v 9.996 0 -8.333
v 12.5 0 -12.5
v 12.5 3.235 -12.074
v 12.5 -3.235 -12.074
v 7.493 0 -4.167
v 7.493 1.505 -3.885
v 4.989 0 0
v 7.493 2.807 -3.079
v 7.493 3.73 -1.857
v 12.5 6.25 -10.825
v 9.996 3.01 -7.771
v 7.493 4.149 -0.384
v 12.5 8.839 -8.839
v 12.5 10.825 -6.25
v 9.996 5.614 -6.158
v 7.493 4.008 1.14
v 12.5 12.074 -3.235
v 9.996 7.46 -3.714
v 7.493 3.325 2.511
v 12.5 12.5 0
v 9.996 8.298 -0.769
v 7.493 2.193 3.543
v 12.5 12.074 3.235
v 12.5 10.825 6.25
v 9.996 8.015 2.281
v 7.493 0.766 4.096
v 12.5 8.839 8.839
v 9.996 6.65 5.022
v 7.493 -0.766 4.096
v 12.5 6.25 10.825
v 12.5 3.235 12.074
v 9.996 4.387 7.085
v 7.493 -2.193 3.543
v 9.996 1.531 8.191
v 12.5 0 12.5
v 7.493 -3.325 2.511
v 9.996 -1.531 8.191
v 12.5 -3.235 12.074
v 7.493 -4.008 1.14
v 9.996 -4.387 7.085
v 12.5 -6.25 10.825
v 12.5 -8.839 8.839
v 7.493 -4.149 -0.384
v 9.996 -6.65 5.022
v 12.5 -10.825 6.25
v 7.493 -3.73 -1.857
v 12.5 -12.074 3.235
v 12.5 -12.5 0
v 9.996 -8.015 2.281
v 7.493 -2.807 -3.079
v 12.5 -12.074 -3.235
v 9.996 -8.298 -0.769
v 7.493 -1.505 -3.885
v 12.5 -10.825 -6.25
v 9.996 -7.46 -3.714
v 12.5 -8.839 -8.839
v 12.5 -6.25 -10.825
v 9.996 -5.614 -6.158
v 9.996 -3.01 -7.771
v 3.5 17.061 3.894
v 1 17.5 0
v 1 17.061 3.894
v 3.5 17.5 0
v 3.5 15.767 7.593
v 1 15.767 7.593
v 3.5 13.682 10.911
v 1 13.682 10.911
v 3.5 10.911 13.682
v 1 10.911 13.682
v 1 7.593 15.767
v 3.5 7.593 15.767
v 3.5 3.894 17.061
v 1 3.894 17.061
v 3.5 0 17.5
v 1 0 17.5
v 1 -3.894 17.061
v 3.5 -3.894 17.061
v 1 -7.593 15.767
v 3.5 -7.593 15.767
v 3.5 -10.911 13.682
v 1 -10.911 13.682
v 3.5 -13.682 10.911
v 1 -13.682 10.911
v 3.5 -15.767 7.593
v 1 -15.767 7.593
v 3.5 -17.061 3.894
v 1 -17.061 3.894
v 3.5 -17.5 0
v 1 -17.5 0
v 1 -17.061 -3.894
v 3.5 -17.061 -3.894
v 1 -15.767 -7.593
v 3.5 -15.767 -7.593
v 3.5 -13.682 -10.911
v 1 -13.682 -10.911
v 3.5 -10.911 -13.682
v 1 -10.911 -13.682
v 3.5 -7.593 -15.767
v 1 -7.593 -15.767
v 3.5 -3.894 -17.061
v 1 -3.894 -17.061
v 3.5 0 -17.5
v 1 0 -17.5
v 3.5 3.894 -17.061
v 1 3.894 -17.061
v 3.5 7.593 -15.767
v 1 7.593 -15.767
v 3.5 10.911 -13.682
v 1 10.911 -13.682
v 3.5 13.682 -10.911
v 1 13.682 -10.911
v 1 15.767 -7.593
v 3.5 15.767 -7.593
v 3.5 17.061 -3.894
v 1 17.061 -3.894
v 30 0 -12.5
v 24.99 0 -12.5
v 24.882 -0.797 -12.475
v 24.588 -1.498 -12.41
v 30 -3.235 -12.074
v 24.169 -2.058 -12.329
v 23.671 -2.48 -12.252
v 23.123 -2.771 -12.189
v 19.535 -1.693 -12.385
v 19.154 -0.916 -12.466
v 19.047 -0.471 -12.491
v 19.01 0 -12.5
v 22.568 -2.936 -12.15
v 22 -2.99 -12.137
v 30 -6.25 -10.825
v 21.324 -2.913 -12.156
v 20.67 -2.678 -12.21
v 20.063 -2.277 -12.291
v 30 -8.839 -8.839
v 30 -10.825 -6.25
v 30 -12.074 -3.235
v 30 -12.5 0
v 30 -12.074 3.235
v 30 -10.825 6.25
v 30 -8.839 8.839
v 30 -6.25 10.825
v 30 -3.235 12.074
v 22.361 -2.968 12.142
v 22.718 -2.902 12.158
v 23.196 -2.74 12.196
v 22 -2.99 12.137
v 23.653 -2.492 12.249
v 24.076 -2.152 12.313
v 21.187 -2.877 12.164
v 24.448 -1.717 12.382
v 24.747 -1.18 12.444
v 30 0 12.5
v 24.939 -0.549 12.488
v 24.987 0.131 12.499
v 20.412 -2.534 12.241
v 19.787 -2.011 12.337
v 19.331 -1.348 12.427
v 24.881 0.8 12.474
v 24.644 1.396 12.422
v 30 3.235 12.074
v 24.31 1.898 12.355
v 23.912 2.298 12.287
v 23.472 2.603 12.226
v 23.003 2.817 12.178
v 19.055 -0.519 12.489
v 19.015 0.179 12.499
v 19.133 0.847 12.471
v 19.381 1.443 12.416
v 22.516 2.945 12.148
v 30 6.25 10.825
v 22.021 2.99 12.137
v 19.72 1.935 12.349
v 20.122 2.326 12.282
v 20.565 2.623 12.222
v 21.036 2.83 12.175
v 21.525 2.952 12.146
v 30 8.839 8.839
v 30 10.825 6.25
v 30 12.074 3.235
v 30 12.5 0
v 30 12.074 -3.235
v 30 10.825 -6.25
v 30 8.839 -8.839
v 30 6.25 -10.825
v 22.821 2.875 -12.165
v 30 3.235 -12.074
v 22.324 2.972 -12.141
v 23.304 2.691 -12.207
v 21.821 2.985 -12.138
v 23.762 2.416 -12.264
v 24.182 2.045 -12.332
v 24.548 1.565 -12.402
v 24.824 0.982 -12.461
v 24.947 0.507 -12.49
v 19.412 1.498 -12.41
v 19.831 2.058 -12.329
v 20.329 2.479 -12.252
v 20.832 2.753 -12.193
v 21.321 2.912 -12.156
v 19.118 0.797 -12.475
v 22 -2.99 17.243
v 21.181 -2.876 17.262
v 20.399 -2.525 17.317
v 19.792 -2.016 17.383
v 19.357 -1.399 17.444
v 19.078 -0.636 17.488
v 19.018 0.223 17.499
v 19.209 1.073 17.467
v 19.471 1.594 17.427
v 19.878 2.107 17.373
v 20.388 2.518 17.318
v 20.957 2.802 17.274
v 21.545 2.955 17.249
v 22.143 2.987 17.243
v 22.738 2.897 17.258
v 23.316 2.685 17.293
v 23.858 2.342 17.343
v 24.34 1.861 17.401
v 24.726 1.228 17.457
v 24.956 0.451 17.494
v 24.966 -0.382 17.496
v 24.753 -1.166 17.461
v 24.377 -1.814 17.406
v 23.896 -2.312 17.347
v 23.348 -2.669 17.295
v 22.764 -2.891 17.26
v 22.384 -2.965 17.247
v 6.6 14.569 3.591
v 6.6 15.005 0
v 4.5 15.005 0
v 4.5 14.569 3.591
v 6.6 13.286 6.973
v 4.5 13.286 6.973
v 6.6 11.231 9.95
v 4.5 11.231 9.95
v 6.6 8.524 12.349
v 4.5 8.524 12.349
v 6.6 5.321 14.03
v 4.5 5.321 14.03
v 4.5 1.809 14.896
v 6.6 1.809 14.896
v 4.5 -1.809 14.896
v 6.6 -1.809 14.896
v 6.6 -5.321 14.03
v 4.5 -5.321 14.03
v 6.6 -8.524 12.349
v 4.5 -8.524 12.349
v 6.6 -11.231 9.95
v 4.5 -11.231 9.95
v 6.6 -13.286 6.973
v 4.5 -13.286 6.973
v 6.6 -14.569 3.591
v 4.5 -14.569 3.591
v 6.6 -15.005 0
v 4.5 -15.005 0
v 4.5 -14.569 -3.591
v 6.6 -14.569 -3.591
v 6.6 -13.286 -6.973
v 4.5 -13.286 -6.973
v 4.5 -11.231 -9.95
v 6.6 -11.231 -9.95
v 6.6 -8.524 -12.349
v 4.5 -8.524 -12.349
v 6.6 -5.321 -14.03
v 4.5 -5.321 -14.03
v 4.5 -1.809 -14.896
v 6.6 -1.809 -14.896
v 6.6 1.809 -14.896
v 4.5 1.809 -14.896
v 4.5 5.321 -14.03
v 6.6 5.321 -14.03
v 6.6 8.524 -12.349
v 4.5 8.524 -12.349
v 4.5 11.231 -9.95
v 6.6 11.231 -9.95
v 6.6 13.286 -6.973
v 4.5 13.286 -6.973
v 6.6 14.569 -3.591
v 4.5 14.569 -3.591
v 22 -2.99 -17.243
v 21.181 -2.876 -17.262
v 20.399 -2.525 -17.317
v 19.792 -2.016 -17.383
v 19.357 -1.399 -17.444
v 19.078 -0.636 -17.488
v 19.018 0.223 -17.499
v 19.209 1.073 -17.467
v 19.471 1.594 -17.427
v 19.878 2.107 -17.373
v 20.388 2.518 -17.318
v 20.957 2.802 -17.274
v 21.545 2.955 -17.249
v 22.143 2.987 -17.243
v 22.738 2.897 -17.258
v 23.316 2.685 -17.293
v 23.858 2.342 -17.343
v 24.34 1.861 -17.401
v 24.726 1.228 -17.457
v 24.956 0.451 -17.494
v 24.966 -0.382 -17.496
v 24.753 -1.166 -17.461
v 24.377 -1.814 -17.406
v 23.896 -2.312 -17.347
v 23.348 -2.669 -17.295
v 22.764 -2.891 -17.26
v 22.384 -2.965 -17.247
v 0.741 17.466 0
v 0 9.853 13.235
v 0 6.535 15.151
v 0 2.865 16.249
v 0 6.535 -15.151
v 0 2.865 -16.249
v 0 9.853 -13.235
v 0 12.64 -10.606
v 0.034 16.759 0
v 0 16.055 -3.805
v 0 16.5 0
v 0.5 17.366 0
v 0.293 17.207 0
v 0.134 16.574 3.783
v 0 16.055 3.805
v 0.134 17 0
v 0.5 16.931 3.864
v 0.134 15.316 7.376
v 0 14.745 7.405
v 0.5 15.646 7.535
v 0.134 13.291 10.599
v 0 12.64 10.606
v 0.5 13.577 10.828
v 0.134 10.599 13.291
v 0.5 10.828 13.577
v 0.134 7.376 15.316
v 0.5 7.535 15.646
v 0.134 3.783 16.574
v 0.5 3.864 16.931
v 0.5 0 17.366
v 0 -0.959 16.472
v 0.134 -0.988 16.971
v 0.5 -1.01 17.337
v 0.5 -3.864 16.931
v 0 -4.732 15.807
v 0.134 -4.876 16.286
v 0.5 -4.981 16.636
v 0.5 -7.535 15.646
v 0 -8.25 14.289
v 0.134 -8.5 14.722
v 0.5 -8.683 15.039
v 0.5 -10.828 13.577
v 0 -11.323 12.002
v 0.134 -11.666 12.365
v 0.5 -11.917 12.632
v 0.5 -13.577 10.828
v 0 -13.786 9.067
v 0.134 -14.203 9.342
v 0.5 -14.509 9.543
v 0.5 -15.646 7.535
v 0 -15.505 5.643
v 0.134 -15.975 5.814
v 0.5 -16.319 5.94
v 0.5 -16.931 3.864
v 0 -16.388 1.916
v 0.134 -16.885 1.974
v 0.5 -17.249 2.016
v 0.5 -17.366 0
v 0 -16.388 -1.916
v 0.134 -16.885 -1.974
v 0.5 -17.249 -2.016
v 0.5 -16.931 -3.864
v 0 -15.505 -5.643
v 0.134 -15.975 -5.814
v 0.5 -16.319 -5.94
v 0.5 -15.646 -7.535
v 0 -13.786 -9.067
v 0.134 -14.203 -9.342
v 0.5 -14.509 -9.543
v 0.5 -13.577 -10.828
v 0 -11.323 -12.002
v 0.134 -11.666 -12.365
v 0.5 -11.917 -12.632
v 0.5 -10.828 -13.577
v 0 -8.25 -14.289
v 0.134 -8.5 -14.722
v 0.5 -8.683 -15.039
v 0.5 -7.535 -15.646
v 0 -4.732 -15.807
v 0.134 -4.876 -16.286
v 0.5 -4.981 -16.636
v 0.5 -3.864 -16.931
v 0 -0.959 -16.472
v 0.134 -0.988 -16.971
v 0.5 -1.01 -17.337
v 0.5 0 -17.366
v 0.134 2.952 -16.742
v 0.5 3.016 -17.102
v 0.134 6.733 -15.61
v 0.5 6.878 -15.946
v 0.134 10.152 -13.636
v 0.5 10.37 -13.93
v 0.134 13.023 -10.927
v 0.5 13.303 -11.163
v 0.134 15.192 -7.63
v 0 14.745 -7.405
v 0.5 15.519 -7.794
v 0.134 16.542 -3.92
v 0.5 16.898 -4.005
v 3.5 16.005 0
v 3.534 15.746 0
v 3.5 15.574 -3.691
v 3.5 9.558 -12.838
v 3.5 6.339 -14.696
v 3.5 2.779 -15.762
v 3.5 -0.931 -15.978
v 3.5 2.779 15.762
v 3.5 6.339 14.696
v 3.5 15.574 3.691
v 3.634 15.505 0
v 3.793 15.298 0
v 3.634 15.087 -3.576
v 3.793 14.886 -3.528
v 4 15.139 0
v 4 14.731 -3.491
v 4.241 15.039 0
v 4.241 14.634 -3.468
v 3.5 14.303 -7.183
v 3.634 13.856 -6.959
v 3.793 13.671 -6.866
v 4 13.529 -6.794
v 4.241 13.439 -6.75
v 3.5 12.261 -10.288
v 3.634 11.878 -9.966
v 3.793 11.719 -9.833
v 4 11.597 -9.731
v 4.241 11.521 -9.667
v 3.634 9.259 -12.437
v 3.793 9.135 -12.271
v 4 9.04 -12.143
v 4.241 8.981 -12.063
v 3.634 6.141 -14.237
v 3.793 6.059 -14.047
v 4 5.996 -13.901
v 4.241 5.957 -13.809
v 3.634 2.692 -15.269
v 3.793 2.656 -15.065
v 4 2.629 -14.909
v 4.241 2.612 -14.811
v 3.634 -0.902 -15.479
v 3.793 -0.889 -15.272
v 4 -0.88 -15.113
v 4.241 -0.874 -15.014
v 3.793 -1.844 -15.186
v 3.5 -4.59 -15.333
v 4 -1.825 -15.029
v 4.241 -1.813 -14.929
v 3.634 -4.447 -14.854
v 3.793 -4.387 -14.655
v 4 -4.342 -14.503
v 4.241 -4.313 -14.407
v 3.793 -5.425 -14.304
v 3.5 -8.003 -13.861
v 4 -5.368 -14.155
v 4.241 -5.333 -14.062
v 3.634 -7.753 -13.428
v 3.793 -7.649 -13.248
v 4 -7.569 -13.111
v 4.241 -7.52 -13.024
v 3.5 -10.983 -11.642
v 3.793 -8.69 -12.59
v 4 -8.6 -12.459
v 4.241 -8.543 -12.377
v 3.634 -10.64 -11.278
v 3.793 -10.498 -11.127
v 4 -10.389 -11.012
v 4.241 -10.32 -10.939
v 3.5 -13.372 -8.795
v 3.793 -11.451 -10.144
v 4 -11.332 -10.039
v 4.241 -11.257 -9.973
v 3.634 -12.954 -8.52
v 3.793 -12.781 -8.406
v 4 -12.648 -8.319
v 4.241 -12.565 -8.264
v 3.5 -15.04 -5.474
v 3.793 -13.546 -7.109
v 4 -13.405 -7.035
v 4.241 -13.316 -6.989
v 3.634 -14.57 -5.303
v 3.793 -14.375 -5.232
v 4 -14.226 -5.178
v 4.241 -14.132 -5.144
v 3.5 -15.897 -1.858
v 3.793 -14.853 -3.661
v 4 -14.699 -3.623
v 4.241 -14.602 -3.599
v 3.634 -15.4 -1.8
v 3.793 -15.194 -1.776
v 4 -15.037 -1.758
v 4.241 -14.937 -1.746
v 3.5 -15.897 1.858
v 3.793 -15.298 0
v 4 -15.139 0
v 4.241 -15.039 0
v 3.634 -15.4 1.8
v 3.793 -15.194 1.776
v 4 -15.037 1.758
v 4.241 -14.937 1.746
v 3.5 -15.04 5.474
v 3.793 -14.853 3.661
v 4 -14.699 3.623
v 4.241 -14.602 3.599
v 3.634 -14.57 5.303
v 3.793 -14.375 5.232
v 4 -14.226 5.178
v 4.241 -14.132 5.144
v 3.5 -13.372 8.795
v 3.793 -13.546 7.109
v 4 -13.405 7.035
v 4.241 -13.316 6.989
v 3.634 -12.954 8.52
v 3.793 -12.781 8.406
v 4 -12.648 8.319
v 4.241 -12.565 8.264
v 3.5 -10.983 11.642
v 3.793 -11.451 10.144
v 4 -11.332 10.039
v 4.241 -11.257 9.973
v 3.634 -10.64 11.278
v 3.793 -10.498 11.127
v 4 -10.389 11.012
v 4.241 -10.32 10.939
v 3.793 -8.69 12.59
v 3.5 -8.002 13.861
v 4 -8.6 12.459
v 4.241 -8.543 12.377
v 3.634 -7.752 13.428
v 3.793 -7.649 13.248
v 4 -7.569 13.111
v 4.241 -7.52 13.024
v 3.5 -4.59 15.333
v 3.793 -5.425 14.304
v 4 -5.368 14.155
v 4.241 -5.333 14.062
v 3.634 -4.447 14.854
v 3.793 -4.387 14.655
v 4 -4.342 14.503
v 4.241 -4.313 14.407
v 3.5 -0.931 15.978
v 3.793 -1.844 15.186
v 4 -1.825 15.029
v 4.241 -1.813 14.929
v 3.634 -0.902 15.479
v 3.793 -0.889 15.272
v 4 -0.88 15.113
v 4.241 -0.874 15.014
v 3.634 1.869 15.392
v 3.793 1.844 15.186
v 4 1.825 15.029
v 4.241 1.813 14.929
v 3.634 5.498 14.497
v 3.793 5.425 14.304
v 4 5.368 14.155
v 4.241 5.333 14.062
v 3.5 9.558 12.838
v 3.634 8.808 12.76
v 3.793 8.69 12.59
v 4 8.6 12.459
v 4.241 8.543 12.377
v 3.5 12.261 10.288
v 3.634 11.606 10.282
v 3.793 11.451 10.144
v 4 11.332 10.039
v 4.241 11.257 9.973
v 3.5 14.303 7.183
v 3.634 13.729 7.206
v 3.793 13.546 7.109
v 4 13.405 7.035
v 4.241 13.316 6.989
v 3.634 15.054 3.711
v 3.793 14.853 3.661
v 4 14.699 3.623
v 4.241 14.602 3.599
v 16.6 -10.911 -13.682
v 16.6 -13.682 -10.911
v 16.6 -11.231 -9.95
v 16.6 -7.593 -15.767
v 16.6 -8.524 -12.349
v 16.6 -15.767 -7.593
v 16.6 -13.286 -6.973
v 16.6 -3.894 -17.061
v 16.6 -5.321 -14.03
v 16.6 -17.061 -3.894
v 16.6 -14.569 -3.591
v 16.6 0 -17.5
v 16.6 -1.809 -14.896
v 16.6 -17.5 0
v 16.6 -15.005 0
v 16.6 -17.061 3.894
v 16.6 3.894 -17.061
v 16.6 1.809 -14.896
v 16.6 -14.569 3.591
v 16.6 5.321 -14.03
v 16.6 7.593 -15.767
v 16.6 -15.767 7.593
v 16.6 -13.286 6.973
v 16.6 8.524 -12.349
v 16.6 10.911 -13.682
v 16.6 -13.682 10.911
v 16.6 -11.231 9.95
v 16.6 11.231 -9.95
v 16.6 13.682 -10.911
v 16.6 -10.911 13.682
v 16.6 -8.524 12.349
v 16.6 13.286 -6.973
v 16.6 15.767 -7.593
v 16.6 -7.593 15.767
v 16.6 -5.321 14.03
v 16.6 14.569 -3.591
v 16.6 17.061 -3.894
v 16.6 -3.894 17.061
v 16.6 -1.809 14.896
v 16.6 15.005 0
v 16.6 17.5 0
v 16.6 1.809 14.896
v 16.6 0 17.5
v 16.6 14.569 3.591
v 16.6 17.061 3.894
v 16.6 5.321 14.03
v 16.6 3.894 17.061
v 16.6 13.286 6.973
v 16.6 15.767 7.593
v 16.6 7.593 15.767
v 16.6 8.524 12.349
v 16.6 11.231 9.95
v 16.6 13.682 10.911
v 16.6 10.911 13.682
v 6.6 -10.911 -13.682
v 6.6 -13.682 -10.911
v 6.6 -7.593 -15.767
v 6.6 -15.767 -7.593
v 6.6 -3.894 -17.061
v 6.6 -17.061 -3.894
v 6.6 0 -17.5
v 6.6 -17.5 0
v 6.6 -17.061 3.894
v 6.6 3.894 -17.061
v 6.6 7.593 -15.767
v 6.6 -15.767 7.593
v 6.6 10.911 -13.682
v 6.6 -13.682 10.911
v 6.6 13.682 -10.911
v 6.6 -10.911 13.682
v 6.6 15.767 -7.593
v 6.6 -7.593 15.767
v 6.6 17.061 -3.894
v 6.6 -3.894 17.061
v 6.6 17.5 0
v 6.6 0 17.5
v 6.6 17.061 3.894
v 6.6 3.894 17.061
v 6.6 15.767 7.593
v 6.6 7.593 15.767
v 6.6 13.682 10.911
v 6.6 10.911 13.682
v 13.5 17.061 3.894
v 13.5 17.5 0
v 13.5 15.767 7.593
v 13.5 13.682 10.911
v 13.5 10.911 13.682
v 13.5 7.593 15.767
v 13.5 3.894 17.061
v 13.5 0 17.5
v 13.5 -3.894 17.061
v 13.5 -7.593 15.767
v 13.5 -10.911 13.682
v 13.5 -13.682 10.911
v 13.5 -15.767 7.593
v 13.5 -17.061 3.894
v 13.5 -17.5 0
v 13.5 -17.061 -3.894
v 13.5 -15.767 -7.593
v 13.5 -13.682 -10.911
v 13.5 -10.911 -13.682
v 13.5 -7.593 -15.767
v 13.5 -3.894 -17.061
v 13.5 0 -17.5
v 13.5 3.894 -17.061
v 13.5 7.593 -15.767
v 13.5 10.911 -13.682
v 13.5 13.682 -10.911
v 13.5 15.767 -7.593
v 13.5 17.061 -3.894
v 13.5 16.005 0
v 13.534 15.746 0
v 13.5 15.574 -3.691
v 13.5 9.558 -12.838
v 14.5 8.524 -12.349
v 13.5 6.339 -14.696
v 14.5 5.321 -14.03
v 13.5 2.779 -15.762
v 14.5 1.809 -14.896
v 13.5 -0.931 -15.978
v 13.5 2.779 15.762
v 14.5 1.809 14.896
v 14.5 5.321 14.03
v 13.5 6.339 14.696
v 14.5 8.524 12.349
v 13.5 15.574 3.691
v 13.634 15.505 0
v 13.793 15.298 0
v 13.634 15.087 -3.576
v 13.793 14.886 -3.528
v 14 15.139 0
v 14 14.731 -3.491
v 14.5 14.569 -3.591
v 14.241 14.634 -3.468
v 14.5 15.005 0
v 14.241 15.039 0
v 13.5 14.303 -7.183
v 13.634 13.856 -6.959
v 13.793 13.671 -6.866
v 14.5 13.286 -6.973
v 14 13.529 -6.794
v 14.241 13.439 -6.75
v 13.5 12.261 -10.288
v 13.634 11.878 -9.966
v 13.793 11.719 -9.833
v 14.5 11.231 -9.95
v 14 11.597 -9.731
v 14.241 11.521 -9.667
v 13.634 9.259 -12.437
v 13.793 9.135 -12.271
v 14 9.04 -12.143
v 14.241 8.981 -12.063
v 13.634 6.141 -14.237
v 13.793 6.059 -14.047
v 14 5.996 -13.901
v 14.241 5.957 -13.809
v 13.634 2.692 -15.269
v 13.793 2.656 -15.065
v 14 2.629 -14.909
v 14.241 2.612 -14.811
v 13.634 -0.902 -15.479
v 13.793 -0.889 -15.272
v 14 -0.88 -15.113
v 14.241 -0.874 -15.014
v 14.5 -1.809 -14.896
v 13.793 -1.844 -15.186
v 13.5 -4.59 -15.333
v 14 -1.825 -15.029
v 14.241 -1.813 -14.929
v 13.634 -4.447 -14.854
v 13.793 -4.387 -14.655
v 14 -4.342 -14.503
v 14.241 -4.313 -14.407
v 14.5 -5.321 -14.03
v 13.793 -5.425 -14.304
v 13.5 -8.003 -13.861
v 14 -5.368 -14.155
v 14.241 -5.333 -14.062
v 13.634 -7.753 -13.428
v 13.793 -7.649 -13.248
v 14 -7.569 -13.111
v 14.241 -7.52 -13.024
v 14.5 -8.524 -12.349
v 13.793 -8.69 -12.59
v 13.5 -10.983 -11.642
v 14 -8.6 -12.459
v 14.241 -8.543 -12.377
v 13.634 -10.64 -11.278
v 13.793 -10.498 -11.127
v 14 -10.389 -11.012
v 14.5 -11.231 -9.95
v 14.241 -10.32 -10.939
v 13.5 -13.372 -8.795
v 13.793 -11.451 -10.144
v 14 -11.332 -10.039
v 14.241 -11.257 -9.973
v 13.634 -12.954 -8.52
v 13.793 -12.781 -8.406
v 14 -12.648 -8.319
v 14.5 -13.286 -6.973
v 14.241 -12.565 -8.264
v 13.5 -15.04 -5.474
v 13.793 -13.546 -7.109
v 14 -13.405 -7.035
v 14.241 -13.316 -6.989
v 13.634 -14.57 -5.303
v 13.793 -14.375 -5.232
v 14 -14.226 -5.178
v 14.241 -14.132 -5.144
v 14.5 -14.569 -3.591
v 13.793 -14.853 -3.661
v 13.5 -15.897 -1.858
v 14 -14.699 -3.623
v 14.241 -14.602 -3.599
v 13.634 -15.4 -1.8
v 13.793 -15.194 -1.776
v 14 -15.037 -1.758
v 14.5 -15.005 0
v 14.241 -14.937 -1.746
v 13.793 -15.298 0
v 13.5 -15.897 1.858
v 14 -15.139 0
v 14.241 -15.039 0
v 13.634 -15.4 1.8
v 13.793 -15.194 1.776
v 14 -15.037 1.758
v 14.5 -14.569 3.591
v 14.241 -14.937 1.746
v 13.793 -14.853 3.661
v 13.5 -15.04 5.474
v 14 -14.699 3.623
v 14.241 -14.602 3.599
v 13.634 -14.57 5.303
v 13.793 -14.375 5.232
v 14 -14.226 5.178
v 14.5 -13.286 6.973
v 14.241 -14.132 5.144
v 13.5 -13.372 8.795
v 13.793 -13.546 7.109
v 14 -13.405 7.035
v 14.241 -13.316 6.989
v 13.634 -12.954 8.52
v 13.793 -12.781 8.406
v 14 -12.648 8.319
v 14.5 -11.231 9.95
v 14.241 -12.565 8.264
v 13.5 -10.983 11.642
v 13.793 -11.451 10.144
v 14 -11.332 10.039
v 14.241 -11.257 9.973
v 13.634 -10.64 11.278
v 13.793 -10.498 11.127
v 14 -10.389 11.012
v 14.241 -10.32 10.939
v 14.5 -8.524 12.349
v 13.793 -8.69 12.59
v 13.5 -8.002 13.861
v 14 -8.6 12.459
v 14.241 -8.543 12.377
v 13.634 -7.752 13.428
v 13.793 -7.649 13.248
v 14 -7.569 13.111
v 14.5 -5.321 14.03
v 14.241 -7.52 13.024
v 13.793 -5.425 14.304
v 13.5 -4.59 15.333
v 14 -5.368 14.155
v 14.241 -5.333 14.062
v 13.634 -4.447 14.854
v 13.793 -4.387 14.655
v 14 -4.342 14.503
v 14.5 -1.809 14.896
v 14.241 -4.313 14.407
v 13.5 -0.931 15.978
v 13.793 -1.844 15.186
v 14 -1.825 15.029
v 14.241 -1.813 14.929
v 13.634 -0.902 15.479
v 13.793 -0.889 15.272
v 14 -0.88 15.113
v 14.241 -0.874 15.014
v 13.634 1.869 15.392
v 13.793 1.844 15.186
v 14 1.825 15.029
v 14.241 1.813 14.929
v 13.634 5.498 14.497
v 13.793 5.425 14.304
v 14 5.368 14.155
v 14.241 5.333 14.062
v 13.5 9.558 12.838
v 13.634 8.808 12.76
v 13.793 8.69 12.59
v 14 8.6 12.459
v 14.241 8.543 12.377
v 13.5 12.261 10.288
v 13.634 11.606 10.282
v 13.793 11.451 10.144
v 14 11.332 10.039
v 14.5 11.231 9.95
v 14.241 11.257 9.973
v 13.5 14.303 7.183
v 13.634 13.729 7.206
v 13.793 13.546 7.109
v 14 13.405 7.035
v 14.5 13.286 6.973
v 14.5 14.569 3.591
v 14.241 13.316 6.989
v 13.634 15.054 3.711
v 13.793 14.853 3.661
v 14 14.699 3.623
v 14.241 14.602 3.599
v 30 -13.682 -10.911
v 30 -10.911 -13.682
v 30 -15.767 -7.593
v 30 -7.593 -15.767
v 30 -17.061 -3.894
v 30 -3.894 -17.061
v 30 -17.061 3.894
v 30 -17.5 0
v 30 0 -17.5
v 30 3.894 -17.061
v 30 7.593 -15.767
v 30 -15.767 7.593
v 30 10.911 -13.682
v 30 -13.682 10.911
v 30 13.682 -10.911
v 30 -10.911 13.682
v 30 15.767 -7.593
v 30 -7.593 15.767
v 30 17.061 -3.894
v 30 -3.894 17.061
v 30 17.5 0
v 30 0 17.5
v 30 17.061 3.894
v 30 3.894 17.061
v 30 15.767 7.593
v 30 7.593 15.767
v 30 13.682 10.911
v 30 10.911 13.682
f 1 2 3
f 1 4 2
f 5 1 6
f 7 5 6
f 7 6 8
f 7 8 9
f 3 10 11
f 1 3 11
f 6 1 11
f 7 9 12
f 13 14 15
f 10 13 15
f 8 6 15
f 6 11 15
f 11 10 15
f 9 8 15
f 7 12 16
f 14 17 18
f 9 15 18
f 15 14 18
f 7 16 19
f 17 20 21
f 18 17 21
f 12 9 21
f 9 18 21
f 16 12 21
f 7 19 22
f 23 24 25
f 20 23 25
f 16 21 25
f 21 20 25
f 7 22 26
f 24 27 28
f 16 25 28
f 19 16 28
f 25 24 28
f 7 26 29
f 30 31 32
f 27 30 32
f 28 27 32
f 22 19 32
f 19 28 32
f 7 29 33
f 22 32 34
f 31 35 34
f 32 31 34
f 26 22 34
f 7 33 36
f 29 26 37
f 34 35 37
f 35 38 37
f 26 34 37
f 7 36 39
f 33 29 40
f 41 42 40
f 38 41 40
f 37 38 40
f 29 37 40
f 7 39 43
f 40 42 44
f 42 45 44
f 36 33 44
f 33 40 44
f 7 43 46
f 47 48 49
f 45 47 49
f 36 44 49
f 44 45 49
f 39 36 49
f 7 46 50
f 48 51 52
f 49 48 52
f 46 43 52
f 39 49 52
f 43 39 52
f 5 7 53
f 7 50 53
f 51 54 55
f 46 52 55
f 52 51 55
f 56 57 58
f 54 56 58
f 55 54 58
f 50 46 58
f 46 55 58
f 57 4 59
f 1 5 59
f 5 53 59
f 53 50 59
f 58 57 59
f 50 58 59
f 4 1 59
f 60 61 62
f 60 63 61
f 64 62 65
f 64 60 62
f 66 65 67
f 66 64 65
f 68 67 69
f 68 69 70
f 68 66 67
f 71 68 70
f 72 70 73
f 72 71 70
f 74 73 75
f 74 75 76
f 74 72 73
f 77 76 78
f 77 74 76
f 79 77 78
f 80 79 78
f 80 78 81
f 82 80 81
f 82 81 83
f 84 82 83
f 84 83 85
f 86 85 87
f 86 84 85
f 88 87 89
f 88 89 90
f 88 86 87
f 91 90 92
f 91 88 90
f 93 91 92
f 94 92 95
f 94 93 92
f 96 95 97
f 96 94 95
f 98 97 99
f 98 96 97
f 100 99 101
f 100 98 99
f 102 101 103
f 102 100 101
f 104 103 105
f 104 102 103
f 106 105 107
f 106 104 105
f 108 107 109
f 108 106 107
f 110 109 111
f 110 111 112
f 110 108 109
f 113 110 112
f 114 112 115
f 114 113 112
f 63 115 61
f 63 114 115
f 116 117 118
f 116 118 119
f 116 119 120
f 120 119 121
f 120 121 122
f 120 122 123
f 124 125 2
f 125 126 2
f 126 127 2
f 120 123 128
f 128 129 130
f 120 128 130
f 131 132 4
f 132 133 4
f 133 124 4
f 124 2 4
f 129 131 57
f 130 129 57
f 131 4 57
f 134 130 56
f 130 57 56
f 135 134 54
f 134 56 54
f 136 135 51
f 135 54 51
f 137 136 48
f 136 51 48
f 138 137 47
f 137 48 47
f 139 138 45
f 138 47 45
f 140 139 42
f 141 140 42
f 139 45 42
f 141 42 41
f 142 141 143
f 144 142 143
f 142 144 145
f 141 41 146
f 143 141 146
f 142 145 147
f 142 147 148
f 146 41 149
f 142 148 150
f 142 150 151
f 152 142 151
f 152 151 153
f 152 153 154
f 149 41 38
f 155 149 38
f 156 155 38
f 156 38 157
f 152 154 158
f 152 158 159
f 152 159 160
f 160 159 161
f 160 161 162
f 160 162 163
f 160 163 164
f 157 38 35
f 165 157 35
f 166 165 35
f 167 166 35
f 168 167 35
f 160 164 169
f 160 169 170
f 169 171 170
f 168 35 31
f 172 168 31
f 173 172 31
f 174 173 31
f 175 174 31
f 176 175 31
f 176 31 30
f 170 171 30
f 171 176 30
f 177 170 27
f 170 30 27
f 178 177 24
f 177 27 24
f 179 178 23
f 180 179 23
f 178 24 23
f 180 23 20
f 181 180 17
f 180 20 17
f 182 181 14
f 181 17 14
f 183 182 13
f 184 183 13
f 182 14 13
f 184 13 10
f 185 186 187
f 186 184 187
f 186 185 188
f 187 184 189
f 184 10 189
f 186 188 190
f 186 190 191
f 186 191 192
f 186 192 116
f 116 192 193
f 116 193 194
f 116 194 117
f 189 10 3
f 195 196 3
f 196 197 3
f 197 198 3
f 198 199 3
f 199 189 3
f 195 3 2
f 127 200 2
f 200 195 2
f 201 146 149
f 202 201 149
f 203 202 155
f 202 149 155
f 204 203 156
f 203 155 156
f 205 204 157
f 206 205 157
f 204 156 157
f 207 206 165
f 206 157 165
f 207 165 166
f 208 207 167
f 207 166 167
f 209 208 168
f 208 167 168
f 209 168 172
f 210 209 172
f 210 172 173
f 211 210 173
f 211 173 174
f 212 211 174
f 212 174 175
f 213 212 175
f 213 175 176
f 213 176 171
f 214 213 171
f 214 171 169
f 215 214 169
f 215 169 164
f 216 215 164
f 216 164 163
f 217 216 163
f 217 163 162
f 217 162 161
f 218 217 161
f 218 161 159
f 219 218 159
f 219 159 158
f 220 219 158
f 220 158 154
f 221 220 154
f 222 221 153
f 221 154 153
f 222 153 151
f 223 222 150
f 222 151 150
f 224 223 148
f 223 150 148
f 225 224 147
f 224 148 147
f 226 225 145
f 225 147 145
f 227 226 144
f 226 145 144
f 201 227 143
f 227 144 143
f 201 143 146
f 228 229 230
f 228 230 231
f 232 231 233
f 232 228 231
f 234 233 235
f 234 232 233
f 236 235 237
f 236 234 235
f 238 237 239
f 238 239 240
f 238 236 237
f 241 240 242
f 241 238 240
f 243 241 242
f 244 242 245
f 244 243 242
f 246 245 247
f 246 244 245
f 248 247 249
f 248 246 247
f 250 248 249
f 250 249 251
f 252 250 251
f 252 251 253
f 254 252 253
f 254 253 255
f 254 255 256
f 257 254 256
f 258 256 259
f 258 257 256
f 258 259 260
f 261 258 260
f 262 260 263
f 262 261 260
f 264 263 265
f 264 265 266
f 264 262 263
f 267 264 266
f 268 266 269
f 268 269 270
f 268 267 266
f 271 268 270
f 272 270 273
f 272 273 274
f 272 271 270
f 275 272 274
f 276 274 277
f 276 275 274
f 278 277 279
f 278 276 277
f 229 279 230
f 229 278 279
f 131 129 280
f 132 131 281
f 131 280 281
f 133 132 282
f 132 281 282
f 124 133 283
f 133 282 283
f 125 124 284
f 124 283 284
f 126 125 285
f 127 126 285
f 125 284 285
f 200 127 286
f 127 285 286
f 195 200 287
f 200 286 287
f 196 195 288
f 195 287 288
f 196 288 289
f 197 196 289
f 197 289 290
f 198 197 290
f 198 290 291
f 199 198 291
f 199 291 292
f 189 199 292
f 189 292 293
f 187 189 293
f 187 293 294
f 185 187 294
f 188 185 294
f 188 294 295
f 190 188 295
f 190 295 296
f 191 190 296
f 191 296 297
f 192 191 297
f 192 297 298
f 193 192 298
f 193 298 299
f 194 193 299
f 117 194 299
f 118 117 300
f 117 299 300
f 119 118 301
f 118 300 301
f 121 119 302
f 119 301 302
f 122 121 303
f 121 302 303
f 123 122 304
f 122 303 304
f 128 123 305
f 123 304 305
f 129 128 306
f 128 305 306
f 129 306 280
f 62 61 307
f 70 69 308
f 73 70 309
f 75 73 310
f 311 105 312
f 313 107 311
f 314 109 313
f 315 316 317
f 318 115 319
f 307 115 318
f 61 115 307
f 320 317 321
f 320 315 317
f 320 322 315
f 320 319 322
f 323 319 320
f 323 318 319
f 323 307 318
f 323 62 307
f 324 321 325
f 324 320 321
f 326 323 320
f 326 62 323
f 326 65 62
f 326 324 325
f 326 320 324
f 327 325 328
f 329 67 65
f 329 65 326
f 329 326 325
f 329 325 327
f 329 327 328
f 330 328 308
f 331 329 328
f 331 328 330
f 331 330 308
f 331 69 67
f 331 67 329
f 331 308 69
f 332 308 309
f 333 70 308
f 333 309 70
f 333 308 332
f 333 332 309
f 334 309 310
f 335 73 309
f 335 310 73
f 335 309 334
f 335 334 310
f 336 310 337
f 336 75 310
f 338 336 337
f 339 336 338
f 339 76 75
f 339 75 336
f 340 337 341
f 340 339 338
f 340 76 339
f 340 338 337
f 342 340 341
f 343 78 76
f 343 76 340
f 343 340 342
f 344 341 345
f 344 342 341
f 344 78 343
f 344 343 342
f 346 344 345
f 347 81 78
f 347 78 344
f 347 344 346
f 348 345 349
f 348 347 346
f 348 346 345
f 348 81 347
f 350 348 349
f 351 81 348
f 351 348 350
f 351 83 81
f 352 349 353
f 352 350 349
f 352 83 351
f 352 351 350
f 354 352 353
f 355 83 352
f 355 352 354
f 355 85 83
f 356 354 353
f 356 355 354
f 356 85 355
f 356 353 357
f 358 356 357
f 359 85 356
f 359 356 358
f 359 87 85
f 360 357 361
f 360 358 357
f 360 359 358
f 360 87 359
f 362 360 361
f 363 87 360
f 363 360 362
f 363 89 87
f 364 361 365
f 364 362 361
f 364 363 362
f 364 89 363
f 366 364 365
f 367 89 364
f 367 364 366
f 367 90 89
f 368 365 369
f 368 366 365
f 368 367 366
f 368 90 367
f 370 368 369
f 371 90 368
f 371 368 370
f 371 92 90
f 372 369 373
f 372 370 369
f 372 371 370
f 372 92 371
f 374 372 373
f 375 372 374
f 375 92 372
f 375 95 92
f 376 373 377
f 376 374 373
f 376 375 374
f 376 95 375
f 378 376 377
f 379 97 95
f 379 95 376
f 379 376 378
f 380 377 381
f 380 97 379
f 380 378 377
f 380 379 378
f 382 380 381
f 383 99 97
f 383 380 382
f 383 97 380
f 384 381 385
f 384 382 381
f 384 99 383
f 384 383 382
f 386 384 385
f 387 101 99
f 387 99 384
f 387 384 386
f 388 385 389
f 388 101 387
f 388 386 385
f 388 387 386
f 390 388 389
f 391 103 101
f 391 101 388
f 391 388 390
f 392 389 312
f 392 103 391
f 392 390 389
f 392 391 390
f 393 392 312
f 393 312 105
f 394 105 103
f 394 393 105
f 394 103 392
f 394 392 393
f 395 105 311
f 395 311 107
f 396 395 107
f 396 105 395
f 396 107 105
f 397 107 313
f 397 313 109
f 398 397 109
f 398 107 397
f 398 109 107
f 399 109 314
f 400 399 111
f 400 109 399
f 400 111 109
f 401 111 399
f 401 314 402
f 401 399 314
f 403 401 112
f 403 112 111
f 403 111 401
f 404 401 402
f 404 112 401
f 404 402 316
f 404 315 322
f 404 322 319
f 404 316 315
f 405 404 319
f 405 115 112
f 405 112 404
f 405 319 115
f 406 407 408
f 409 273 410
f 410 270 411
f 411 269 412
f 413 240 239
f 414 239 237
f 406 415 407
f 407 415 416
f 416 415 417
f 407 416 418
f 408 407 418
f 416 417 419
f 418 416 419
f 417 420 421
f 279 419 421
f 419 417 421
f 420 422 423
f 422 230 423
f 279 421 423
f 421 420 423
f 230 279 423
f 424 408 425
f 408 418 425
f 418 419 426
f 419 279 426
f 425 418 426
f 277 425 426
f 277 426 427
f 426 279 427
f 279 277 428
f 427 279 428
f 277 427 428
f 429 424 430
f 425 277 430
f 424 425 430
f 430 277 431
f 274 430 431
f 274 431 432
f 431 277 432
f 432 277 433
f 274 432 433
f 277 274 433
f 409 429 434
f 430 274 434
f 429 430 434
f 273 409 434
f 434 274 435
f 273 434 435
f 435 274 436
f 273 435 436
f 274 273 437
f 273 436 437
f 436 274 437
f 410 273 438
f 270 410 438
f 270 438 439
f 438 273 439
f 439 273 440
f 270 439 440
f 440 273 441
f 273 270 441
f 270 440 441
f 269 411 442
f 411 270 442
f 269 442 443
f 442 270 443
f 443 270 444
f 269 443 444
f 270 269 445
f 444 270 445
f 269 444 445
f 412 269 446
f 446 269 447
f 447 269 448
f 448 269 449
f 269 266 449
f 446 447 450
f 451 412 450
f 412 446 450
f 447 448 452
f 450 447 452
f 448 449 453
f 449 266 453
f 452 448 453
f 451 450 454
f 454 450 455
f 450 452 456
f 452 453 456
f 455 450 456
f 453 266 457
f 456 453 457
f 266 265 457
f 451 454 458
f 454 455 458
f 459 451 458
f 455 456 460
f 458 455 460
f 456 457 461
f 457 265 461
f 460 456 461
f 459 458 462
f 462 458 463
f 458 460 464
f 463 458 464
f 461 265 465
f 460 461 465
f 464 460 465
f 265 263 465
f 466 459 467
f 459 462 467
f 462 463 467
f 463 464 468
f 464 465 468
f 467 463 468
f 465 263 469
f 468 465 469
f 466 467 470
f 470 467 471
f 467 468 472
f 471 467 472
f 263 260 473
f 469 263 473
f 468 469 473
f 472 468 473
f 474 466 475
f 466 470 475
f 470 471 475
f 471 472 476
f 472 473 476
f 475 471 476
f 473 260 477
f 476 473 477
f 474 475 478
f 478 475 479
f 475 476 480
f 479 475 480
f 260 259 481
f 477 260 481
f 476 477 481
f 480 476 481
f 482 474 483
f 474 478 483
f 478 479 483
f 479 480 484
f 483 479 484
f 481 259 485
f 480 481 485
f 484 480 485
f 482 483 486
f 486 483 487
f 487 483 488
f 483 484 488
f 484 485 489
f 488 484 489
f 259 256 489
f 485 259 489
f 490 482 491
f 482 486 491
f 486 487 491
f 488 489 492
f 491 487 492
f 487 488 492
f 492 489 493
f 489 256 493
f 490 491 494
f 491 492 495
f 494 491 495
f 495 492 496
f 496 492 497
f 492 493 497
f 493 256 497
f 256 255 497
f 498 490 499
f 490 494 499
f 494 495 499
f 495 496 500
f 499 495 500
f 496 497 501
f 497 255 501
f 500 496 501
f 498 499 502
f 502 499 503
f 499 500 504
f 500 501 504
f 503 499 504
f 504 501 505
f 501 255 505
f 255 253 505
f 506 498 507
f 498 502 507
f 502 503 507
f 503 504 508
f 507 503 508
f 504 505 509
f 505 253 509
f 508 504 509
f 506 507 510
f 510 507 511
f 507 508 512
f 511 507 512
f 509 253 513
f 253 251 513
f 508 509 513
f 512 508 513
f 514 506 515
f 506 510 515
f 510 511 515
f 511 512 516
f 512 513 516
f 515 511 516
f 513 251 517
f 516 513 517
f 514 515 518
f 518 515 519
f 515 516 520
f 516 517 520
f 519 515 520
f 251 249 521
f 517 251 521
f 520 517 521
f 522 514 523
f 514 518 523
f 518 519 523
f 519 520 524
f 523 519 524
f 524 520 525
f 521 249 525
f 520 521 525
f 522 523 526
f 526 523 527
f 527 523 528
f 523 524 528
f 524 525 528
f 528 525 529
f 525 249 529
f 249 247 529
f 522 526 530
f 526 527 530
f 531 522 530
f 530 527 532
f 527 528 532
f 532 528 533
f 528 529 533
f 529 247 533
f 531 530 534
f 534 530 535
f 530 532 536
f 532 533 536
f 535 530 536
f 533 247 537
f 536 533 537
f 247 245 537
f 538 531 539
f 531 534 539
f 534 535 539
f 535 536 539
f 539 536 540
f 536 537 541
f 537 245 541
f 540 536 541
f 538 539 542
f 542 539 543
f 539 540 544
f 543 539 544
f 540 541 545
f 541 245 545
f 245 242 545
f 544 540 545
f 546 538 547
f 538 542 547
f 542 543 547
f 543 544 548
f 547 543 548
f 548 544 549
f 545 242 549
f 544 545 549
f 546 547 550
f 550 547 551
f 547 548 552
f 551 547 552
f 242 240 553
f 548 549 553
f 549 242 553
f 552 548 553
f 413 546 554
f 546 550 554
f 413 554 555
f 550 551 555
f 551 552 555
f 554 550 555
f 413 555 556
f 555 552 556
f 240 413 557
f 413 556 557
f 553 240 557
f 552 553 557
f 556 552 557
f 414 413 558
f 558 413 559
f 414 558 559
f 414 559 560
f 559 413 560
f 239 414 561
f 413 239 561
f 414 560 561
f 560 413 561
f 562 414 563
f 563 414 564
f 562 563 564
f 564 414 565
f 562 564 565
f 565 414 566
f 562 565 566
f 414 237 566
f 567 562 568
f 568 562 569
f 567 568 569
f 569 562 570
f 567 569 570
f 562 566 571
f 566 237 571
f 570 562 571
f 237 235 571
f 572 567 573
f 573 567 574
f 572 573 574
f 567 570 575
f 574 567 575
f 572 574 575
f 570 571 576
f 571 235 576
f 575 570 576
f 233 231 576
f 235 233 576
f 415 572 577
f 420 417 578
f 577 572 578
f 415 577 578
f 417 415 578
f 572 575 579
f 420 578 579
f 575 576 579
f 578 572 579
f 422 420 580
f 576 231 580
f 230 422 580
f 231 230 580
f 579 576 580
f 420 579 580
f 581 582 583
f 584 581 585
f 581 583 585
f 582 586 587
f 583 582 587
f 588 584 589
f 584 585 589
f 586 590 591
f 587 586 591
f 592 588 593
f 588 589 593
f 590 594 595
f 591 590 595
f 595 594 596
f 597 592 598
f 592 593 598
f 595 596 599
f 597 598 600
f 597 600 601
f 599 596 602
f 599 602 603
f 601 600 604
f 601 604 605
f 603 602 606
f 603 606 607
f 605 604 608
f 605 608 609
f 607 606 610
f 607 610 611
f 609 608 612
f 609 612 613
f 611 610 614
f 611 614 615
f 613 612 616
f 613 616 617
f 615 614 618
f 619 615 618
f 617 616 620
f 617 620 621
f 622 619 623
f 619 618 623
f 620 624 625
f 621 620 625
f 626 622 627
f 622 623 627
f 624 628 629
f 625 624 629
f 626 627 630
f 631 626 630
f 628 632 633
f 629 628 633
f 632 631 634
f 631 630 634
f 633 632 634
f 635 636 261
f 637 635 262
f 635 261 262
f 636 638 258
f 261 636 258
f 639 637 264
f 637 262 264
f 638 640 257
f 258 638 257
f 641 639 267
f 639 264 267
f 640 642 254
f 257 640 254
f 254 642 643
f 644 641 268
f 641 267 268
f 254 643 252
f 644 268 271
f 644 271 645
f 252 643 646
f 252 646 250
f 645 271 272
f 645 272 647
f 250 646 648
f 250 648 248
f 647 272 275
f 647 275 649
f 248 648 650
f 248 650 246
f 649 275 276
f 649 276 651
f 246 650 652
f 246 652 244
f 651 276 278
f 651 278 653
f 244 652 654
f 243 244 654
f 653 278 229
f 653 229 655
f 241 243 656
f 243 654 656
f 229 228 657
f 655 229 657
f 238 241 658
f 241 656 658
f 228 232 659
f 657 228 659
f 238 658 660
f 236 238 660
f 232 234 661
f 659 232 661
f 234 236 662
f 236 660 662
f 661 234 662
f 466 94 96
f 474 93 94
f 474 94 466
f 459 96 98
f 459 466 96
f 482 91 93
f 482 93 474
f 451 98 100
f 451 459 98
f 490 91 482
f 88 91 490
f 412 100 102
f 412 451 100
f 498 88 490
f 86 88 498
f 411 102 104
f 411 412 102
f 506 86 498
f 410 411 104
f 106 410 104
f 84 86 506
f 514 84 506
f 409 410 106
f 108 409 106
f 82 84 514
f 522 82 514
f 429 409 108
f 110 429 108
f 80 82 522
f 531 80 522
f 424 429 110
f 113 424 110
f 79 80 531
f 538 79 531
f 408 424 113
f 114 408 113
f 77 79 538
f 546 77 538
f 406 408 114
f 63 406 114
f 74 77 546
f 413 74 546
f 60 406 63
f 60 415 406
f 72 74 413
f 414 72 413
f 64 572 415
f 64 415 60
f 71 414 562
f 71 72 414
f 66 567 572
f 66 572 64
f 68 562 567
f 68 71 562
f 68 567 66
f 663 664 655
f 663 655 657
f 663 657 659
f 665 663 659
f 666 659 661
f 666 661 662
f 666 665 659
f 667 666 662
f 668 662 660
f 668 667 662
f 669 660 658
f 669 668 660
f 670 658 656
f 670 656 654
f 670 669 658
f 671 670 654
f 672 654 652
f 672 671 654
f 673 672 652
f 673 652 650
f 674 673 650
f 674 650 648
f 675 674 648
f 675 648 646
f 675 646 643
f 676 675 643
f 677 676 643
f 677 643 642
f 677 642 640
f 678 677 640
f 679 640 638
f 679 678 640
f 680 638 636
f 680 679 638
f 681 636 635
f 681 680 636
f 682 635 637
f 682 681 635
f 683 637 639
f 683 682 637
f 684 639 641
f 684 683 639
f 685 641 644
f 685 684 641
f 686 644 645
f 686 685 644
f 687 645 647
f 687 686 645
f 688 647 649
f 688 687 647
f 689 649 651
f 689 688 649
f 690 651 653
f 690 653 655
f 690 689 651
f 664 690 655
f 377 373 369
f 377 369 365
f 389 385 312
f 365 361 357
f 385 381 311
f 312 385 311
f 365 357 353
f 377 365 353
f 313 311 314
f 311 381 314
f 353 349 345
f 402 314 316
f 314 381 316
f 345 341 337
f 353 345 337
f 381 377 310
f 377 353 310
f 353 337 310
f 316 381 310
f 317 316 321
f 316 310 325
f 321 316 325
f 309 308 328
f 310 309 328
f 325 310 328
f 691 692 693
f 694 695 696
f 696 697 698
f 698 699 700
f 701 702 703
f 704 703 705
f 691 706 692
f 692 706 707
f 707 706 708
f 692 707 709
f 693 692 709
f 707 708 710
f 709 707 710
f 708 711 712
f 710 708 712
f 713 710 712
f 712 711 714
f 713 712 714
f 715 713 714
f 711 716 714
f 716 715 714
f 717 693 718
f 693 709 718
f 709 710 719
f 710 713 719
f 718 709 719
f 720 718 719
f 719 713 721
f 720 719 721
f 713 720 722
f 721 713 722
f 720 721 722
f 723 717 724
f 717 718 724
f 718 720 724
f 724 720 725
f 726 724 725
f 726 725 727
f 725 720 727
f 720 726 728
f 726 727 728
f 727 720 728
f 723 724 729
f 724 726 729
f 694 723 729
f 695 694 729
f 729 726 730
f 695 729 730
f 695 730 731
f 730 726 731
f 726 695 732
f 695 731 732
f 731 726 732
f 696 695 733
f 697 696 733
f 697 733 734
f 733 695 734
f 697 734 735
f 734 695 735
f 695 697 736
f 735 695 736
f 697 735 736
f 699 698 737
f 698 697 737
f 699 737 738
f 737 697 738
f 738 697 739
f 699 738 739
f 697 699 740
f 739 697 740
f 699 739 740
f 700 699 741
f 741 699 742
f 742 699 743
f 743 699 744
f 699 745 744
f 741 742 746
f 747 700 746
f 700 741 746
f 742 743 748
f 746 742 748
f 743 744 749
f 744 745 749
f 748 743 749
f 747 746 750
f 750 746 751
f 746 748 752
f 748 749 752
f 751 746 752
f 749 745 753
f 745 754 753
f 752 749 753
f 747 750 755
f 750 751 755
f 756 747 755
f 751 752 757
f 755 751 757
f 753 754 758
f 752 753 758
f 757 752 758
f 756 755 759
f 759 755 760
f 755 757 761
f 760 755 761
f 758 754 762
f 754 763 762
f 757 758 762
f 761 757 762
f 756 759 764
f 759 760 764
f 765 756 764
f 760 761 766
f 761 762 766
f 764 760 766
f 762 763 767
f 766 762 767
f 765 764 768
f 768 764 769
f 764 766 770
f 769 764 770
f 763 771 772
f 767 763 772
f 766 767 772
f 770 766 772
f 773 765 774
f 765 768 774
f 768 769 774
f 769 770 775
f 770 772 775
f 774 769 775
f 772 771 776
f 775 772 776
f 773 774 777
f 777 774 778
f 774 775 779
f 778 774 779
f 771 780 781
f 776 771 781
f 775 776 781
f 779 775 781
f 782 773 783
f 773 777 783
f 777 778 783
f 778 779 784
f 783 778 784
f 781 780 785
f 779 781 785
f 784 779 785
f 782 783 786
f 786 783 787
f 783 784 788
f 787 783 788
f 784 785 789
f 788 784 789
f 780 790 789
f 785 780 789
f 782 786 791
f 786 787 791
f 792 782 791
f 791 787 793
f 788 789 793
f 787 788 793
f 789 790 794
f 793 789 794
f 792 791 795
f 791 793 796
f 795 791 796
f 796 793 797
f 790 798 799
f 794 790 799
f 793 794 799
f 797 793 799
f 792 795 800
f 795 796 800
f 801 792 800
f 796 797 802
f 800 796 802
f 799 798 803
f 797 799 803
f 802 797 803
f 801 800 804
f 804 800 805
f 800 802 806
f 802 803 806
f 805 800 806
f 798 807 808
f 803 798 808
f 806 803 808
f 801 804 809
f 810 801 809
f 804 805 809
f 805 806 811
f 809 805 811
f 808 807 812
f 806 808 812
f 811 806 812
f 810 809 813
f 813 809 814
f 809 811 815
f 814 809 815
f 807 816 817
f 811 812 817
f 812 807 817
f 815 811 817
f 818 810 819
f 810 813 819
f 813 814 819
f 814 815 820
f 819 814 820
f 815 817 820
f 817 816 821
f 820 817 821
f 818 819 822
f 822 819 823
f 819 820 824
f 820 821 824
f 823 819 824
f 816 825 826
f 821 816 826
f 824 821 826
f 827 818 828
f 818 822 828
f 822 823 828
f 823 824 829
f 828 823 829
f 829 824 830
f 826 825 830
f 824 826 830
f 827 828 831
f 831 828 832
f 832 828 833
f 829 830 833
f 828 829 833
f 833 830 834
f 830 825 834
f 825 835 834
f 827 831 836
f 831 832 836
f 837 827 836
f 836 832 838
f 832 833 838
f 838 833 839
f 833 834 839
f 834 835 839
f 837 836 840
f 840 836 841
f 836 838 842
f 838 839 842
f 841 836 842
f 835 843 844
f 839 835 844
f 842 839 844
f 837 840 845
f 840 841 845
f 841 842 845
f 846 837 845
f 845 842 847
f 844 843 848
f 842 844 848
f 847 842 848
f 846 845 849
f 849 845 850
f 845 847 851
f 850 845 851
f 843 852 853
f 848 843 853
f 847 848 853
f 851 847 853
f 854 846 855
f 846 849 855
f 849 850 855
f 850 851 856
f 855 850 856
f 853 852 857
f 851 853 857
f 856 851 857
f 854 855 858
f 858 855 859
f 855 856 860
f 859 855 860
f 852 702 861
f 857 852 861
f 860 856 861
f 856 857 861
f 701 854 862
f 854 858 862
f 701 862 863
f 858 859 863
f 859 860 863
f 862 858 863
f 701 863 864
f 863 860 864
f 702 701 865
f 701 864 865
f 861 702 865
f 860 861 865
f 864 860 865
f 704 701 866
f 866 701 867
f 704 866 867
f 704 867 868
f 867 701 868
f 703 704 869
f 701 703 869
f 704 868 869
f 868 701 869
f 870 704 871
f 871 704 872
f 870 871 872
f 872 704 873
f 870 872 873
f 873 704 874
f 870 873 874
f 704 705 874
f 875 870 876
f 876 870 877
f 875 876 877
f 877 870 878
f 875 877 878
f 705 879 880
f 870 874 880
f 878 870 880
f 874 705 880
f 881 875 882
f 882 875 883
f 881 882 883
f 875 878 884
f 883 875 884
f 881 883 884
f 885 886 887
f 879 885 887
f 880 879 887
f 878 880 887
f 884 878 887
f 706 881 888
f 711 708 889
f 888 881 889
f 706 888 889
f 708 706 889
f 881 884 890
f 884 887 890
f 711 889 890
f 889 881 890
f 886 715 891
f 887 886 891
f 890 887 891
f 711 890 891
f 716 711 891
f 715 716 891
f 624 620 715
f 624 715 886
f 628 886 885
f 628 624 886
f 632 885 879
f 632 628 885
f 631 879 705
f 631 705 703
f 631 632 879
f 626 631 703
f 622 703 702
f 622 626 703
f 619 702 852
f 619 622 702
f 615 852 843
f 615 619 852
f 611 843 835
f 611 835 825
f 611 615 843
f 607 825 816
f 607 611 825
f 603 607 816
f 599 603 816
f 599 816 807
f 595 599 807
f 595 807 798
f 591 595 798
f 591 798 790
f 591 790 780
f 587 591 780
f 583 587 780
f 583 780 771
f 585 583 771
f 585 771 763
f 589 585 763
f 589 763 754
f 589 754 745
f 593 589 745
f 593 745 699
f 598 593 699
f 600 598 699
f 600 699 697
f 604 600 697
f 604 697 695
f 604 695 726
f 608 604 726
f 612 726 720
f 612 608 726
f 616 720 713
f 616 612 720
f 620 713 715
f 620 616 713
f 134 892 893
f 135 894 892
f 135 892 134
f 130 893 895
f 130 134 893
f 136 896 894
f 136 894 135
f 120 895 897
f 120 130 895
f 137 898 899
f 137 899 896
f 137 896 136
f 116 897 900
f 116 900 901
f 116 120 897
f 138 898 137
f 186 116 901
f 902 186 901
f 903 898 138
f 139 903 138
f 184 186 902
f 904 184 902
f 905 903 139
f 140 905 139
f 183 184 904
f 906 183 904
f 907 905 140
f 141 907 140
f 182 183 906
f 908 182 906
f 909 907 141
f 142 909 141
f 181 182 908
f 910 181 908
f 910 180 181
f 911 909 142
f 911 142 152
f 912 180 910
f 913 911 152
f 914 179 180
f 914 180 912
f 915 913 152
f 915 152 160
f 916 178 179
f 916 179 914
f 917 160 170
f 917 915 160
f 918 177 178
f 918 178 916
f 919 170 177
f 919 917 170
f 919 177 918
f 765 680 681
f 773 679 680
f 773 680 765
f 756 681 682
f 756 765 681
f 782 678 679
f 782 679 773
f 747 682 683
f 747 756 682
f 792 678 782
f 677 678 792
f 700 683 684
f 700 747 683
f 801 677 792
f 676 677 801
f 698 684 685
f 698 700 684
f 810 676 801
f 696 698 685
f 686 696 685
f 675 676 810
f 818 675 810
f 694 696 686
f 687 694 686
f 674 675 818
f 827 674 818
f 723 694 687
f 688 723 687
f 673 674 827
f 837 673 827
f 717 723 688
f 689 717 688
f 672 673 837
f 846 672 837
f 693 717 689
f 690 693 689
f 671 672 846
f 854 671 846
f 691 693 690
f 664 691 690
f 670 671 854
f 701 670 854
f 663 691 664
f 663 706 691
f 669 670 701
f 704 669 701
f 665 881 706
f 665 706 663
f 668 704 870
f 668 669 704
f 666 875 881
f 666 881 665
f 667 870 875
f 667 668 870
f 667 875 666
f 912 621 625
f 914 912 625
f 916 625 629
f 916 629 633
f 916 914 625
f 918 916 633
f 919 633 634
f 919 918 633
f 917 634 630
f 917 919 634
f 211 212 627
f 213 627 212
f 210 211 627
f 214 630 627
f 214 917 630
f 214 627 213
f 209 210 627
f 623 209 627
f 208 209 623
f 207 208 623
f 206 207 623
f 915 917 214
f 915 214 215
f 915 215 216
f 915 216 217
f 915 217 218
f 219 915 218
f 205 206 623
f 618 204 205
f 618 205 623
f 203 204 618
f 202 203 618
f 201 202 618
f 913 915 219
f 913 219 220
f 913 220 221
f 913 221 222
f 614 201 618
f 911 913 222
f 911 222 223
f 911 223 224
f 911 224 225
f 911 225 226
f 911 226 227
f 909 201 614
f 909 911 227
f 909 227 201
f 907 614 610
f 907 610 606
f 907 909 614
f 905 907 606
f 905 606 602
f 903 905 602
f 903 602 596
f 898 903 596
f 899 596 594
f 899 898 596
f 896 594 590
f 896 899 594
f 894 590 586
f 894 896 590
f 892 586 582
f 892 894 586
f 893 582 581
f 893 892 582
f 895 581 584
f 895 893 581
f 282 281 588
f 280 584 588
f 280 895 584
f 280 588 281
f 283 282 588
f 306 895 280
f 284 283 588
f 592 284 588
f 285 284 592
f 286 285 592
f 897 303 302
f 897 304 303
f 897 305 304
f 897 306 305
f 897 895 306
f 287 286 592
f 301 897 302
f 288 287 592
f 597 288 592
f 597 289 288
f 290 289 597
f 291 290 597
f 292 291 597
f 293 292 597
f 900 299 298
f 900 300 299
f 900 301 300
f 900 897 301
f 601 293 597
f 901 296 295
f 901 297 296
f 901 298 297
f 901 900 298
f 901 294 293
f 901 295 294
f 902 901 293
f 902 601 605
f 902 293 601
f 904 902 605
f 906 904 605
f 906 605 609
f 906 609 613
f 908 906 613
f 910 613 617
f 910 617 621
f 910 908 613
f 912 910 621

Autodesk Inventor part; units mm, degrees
ref_plane "YZ Plane" through (0, 0, 0) normal (1, 0, 0) x (0, 1, 0)
ref_plane "XZ Plane" through (0, 0, 0) normal (0, 1, 0) x (-1, 0, 0)
sketch "Skizze1" plane through (0, 0, 0) normal (0, 0, 1) x (1, 0, 0)
  line L0 (0, 0) -> (30, 0)
  line L1 (0, 0) -> (0, 17.5)
  line L2 (0, 17.5) -> (3.5, 17.5)
  line L3 (3.5, 17.5) -> (3.5, 15.005)
  line L4 (3.5, 15.005) -> (6.6, 15.005)
  line L5 (6.6, 15.005) -> (6.6, 17.5)
  line L6 (6.6, 17.5) -> (13.5, 17.5)
  line L7 (13.5, 17.5) -> (13.5, 15.005)
  line L8 (13.5, 15.005) -> (16.6, 15.005)
  line L9 (16.6, 15.005) -> (16.6, 17.5)
  line L10 (16.6, 17.5) -> (30, 17.5)
  line L11 (30, 17.5) -> (30, 0)
  point P0 (13.5, 16.2525)
  dimension "d0" = 35
  dimension "d1" = 30.01
  dimension "d3" = 16.5
  dimension "d4" = 26.5
  dimension "d5" = 30
  dimension "d6" = 3.1
revolve "Umdrehung1" add sketch "Skizze1" angle 360 about axis through (0, 0, 0) along (1, 0, 0)
sketch "Skizze2" plane through (30, 0, 0) normal (1, 0, 0) x (0, 0, -1)
  circle A0 centre (0, 0) radius 17.5 projected
hole "Bohrung1" at (30, 0, 0) direction (-1, 0, 0) diameter 25 depth 17.5 tip angle 118
fillet "Rundung1" radius 1 1 edges at (0, -17.5, 0)
fillet "Rundung2" radius 1 2 edges at (3.5, -15.005, 0) (13.5, -15.005, 0)
ref_plane "Arbeitsebene13" through (0, 0, 0) normal (0, 0, 1) x (1, 0, 0)
sketch "Skizze17" plane through (0, 0, 0) normal (0, 0, 1) x (1, 0, 0)
  line L0 (30, 12.5) -> (30, -12.5) projected
  point P0 (0, 0)
  point P1 (22, 0)
  dimension "d51" = 8
hole "Bohrung4" at (22, 0, 0) direction (0, 0, -1) diameter 5.98 end through all both
properties part number "Kolben" material "Stahl, galvanisiert"
